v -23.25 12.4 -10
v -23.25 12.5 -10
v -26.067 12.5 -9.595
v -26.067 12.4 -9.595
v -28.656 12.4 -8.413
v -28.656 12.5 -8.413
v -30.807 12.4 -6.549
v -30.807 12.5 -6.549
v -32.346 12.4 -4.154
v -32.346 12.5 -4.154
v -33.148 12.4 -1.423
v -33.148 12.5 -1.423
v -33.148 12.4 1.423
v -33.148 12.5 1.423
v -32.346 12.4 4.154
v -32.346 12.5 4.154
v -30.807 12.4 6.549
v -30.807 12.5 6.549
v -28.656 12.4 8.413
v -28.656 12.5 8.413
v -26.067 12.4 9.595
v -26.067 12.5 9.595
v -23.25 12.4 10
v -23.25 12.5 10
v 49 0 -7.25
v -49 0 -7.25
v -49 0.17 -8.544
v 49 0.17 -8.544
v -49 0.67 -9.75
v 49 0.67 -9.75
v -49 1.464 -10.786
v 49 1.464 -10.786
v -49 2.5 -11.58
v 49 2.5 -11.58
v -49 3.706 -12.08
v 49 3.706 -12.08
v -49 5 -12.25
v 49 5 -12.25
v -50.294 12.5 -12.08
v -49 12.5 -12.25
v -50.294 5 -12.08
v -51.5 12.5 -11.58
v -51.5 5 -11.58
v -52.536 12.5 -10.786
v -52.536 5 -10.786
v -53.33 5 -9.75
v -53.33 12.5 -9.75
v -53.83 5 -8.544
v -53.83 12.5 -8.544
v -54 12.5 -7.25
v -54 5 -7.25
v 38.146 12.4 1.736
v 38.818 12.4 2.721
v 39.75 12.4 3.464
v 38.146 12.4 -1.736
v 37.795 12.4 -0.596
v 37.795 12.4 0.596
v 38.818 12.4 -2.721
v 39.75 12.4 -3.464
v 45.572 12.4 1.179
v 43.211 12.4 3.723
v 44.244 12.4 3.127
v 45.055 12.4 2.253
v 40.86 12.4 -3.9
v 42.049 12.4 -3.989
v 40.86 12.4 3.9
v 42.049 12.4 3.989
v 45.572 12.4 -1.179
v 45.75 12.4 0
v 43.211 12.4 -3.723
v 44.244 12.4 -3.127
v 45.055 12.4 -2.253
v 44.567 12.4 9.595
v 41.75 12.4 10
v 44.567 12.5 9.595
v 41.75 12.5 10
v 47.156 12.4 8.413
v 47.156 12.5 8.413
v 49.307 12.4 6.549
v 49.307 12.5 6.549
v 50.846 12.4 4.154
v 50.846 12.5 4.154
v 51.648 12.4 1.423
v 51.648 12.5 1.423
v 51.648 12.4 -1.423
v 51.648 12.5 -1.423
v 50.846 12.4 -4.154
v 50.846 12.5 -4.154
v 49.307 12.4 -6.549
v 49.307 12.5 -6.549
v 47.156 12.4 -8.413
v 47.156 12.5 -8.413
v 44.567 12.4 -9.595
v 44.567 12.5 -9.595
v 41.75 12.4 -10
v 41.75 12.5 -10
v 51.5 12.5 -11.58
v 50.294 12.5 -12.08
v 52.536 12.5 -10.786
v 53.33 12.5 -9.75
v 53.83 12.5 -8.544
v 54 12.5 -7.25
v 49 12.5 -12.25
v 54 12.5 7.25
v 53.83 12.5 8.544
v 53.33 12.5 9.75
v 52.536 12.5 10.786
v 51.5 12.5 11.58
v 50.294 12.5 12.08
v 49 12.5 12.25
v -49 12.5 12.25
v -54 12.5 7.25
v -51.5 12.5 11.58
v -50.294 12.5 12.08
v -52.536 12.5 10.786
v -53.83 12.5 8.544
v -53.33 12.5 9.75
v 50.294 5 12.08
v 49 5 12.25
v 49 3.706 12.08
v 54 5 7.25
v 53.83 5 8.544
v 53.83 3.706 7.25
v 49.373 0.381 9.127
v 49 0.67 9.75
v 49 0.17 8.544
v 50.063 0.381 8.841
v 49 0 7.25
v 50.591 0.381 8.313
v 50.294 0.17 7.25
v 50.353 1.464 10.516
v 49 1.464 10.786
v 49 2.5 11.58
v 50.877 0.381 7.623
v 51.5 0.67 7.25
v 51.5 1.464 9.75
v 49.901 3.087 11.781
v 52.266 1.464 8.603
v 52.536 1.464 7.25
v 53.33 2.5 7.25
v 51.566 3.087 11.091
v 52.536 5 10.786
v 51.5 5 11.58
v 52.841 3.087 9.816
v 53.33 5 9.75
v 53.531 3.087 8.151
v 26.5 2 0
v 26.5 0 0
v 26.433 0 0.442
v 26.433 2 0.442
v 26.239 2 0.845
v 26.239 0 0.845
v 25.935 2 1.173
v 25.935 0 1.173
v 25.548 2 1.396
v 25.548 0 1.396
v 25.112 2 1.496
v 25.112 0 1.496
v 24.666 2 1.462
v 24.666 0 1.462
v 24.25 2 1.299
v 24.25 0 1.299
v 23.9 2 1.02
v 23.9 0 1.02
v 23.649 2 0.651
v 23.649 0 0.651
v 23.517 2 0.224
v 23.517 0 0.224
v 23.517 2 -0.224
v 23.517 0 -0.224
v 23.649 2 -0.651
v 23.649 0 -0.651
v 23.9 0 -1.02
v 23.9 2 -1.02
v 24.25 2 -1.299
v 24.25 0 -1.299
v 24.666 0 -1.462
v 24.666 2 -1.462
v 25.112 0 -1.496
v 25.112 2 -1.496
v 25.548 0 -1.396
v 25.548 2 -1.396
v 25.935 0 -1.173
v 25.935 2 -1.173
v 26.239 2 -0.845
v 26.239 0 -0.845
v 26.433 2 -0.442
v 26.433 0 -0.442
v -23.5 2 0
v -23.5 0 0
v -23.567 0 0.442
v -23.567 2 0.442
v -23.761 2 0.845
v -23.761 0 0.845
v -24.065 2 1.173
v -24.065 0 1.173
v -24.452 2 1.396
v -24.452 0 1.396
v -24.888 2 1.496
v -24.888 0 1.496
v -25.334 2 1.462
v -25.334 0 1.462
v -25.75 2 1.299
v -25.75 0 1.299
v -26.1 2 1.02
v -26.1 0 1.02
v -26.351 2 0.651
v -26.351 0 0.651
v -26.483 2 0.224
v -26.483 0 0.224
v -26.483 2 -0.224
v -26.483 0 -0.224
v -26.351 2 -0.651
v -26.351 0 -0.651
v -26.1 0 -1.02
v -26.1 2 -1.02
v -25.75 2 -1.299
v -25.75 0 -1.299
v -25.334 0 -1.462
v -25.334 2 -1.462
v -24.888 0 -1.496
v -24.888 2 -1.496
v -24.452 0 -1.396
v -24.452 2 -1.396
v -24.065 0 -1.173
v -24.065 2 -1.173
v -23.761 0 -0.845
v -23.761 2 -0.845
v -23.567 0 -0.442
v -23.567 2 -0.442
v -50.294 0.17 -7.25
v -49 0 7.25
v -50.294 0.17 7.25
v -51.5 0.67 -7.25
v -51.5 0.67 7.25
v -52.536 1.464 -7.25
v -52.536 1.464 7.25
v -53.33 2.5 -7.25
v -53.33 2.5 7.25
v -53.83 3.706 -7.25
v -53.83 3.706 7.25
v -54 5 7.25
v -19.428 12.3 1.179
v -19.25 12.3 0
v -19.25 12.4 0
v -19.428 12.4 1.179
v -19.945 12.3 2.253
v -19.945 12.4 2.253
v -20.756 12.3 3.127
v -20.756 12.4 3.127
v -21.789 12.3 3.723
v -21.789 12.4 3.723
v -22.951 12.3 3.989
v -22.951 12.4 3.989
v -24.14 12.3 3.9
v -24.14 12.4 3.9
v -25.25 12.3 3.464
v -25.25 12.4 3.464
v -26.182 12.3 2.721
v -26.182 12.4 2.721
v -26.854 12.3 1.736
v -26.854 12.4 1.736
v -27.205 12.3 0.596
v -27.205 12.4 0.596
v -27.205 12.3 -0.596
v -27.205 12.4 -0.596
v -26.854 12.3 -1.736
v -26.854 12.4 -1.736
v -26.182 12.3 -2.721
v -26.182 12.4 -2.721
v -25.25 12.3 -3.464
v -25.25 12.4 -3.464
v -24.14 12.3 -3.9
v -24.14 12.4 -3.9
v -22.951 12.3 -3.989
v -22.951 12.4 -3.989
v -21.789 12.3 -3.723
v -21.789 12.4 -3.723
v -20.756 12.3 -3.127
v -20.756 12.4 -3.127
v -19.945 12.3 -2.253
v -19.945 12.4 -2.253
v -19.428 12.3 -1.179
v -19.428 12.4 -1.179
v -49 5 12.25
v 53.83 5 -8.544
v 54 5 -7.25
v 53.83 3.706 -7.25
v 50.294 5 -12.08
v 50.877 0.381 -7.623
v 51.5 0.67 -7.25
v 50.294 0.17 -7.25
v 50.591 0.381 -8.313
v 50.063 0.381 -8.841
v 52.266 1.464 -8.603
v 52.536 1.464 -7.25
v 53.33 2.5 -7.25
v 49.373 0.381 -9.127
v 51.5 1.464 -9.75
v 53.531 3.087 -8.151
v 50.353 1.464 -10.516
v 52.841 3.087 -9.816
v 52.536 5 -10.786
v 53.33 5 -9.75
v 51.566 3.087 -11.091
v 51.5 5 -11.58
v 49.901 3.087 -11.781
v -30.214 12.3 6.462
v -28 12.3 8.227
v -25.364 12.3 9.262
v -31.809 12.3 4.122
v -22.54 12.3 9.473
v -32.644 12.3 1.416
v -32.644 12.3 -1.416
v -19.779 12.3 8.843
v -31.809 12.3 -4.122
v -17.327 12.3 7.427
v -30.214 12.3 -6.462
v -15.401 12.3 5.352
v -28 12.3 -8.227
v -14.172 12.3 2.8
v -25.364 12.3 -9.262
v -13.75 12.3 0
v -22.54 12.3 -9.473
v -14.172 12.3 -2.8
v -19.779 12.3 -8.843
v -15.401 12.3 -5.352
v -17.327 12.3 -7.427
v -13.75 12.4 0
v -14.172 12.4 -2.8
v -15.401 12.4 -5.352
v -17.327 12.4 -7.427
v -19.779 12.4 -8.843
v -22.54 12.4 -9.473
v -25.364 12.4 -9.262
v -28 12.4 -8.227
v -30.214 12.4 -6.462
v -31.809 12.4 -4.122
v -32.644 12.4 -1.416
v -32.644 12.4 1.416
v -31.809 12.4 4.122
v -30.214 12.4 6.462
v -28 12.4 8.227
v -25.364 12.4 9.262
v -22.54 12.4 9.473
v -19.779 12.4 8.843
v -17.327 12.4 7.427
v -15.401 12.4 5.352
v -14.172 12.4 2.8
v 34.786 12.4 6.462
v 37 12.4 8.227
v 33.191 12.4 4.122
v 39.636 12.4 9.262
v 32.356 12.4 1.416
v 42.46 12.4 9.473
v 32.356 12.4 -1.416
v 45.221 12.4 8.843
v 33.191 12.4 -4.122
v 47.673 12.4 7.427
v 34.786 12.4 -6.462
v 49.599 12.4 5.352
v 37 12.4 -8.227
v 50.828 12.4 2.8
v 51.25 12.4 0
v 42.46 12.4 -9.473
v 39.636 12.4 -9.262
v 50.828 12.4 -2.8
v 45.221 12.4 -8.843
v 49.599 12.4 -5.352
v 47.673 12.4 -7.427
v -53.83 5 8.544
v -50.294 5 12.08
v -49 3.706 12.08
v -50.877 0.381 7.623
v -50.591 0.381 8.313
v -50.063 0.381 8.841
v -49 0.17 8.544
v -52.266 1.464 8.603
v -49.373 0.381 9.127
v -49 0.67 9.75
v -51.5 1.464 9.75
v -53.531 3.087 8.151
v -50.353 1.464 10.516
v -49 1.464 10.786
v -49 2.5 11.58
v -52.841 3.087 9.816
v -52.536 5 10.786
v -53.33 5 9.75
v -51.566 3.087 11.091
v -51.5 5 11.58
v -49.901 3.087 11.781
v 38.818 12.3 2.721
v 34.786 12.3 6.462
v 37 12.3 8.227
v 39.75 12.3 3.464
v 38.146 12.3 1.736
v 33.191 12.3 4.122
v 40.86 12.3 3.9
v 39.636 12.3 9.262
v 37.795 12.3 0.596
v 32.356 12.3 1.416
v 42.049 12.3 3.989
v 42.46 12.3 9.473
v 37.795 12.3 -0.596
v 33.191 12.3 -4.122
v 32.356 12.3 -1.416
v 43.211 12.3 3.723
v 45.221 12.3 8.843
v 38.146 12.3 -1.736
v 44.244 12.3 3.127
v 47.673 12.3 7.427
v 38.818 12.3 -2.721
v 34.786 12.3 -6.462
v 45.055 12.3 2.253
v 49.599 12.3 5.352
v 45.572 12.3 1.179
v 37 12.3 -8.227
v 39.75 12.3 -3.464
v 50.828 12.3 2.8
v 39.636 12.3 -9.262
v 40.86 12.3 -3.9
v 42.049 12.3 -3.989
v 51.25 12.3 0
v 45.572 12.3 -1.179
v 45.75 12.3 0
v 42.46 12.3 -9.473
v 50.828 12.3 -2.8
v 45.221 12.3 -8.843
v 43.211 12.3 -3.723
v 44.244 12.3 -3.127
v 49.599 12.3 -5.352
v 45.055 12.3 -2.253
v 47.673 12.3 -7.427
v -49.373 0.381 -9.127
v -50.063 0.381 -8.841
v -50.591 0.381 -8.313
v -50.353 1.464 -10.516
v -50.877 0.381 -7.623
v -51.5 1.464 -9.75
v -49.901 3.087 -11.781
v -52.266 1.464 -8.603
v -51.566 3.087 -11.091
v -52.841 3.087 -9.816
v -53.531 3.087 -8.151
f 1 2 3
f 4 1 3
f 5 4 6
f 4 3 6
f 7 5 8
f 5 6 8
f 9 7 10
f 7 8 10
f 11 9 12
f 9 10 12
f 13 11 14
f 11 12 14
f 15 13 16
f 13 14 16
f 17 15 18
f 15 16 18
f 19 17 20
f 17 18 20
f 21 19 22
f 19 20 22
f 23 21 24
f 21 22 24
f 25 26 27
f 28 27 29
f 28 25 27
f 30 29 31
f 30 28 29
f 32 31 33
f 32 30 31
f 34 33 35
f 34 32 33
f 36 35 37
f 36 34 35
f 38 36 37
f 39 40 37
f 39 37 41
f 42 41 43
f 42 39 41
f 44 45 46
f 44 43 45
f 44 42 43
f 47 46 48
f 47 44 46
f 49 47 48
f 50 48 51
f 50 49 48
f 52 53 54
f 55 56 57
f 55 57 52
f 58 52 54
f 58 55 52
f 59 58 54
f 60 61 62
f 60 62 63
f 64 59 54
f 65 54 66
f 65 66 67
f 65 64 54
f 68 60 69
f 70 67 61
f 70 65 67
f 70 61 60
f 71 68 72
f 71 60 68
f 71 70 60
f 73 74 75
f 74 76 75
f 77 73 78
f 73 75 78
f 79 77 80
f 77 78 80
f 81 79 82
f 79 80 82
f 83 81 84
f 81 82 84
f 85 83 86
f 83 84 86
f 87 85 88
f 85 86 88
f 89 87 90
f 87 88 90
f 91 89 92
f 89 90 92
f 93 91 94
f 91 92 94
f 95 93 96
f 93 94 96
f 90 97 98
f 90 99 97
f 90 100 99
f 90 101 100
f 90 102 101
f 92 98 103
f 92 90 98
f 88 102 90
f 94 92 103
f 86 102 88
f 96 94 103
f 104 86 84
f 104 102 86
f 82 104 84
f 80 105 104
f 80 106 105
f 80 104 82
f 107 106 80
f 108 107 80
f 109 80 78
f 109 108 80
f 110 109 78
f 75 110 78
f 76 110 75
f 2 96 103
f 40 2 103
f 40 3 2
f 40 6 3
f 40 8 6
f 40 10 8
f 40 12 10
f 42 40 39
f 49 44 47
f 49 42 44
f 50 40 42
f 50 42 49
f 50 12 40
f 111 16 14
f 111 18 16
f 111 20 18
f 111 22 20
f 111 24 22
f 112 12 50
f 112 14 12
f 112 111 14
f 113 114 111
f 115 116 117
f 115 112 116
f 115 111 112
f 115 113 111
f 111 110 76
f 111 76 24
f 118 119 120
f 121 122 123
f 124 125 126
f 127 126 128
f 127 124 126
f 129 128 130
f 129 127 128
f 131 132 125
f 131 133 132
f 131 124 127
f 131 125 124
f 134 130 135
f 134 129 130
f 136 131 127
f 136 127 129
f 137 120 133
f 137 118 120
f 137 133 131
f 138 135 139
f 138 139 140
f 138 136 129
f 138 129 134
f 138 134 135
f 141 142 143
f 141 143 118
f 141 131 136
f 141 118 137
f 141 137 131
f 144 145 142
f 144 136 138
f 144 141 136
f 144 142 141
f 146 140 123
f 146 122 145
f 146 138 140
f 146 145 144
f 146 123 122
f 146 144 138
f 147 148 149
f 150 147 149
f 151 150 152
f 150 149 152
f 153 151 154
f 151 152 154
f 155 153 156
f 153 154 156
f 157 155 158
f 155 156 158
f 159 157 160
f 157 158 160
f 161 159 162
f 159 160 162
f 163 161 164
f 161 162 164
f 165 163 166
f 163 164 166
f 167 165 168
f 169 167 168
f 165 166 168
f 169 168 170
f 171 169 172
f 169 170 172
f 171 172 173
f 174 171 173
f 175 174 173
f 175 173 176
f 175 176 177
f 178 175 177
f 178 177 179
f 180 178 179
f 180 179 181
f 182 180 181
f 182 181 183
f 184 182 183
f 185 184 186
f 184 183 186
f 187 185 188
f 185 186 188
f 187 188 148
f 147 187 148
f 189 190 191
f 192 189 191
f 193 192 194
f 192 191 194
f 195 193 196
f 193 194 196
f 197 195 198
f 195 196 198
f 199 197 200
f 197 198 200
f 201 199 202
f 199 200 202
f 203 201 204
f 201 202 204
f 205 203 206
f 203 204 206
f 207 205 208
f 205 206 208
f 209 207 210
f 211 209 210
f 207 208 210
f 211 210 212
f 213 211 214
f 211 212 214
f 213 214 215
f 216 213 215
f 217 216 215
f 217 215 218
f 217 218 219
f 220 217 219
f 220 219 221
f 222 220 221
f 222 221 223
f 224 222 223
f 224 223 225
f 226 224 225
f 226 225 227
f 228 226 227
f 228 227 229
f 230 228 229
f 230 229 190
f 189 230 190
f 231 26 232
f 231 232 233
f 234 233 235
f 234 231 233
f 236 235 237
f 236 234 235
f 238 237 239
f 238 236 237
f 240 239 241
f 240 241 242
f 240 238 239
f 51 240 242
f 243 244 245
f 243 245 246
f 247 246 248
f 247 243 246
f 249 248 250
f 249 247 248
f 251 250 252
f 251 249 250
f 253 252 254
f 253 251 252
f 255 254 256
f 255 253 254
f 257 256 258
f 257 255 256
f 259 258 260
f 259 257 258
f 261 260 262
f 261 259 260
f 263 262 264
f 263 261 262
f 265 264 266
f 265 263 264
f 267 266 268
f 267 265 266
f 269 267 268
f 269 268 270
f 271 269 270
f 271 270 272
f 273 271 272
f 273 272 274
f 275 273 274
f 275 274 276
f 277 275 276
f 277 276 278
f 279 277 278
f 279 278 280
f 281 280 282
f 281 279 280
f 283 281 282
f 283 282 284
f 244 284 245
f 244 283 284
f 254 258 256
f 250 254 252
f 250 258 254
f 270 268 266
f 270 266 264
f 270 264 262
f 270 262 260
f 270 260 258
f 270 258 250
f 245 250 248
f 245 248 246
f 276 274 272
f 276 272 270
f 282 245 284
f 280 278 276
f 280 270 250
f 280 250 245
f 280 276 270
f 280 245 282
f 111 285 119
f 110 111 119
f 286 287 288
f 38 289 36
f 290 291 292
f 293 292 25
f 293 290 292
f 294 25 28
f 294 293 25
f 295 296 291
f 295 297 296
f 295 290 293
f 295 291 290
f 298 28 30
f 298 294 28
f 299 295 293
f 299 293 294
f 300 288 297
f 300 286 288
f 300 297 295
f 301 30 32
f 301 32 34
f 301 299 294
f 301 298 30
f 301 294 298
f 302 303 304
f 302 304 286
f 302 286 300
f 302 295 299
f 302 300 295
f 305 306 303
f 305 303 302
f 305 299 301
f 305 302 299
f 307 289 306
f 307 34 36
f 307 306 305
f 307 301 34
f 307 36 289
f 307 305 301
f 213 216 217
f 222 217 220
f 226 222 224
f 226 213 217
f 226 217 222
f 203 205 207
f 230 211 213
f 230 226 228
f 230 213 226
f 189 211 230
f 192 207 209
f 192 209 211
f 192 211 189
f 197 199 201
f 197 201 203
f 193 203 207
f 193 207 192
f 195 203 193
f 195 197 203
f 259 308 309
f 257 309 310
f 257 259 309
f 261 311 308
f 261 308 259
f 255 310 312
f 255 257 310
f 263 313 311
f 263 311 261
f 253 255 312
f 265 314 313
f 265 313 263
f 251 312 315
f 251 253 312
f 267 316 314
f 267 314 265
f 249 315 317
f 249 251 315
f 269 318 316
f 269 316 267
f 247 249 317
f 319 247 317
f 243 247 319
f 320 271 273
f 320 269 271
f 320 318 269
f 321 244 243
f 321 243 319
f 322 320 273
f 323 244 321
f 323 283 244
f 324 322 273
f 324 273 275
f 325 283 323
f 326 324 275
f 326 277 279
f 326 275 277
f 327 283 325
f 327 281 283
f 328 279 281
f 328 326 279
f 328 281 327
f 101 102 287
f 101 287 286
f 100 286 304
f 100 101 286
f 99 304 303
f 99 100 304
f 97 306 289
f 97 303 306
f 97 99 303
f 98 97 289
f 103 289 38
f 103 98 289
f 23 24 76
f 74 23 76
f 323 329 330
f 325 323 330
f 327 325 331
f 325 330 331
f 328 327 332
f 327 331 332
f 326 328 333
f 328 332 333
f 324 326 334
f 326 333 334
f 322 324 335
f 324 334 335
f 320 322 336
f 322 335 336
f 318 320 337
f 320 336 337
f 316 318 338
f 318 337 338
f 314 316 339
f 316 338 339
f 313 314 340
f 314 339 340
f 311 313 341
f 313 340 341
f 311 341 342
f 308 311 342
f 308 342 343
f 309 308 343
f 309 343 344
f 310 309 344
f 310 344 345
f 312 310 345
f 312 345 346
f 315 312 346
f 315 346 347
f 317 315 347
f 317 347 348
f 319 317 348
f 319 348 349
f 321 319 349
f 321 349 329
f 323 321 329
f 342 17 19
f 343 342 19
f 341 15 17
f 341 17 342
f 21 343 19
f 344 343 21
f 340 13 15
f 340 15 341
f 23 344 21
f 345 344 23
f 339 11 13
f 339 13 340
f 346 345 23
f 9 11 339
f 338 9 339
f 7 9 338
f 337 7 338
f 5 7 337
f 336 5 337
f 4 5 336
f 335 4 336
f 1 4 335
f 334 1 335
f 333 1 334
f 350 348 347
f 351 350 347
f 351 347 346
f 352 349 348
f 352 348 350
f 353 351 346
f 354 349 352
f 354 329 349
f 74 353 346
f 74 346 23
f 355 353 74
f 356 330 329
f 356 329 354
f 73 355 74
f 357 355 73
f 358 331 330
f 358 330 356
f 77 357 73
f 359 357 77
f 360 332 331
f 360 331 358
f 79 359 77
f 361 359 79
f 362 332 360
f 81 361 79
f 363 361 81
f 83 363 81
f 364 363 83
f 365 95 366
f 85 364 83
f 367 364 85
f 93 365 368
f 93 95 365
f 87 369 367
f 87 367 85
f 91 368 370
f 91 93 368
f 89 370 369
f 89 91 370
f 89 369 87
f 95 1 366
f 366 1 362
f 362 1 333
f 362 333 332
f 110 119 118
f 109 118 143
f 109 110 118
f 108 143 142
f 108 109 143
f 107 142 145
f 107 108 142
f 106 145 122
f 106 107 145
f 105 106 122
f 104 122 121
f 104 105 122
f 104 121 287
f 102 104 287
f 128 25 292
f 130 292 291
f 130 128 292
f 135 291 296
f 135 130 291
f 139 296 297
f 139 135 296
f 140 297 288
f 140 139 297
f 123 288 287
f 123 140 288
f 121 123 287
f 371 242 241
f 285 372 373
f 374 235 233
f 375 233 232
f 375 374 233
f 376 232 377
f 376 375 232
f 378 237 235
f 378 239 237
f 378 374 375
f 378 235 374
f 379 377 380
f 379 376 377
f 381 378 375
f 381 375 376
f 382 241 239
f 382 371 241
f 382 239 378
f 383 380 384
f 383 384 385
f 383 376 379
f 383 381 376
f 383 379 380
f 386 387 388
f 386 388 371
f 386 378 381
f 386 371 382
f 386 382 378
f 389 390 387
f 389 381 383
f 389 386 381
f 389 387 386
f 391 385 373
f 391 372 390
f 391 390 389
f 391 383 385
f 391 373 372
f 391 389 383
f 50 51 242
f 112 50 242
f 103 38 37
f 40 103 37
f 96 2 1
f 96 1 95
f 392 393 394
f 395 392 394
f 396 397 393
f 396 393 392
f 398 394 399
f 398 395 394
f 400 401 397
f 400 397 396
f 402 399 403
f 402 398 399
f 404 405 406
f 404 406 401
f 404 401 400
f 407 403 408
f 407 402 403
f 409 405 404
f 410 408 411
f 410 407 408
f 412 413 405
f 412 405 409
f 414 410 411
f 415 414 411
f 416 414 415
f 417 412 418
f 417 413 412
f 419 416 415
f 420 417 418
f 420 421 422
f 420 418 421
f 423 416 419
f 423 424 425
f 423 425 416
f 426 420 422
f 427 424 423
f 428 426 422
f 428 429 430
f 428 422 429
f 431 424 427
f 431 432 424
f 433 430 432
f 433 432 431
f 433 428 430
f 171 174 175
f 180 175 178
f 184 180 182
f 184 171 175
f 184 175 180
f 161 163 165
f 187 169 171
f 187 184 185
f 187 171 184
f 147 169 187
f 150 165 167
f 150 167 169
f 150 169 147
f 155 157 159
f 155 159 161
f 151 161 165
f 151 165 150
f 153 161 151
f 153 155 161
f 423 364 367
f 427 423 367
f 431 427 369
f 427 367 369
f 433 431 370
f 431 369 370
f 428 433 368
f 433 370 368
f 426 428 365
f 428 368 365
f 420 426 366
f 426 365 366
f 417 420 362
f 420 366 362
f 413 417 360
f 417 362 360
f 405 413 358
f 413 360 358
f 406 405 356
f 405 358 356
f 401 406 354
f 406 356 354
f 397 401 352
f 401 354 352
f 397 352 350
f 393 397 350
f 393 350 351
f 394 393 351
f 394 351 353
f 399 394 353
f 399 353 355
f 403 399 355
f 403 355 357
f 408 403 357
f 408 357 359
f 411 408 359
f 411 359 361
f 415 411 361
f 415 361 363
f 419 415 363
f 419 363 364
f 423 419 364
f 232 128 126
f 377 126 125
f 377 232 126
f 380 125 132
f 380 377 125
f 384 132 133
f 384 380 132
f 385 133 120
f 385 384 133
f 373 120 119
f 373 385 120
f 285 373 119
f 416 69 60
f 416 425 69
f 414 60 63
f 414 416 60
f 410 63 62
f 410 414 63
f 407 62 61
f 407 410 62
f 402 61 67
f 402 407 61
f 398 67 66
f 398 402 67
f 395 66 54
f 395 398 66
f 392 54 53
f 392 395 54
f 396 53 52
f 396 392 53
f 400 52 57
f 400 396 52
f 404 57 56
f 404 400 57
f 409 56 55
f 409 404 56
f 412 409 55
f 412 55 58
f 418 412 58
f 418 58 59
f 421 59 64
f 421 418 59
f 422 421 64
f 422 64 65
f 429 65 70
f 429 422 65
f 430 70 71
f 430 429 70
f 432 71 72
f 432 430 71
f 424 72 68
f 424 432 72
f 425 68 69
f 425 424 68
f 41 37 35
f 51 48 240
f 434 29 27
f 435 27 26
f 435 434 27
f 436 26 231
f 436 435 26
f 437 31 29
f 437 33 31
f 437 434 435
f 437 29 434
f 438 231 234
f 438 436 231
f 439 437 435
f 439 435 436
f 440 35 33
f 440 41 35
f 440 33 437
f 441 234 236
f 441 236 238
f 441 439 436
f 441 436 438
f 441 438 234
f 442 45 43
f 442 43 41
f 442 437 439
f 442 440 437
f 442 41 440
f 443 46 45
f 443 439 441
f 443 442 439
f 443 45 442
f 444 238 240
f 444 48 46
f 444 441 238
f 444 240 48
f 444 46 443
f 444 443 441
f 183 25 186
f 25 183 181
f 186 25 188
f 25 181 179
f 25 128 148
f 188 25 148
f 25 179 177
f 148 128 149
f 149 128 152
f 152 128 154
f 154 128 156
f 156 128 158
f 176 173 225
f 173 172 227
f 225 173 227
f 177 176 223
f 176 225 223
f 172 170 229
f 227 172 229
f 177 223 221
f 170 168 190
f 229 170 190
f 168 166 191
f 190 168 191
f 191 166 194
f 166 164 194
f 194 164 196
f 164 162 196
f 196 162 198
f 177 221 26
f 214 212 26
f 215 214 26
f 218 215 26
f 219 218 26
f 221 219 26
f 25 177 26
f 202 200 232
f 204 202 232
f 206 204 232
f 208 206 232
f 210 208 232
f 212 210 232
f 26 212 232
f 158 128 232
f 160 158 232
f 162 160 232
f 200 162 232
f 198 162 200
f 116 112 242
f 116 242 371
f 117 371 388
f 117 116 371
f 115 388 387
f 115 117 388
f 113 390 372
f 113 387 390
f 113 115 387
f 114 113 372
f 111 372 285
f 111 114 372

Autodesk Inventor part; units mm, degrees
ref_plane "YZ Plane" through (0, 0, 0) normal (1, 0, 0) x (0, 1, 0)
ref_plane "XZ Plane" through (0, 0, 0) normal (0, 1, 0) x (-1, 0, 0)
ref_plane "XY Plane" through (0, 0, 0) normal (0, 0, 1) x (1, 0, 0)
sketch "Sketch1" plane through (0, 0, 0) normal (0, 1, 0) x (-1, 0, 0)
  line L0 (0, 0) -> (0, -12.25)
  line L1 (0, -12.25) -> (54, -12.25)
  line L2 (54, -12.25) -> (54, 12.25)
  line L3 (54, 12.25) -> (-54, 12.25)
  line L4 (-54, 12.25) -> (-54, -12.25)
  line L5 (-54, -12.25) -> (0, -12.25)
  dimension "d0" = 12.25
  dimension "d1" = 54
  dimension "d2" = 24.5
  dimension "d3" = 108
  dimension "d4" = 24.5
extrude "Extrusion1" add sketch "Sketch1" along normal blind 12.5
fillet "Fillet1" radius 5 4 edges at (-54, 6.25, 12.25) (-54, 6.25, -12.25) (54, 6.25, 12.25) (54, 6.25, -12.25)
sketch "Sketch2" plane through (0, 12.5, 0) normal (0, 1, 0) x (1, 0, 0)
  line L0 (54, -7.25) -> (54, 7.25) projected
  line L1 (54, 0) -> (41.75, 0)
  circle A0 centre (41.75, 0) radius 10
  line L2 (41.75, 0) -> (-23.25, 0)
  circle A1 centre (-23.25, 0) radius 10
  line L3 (-23.25, 10) -> (41.75, 10)
  line L4 (-23.25, -10) -> (41.75, -10)
  point P0 (0, 0)
  dimension "d8" = 12.25
  dimension "d9" = 20
  dimension "d10" = 65
  dimension "d11" = 20
extrude "Extrusion2" cut sketch "Sketch2" against normal blind 0.1
sketch "Sketch3" plane through (0, 12.4, 0) normal (0, 1, 0) x (1, 0, 0)
  line L0 (-23.25, 10) -> (41.75, 10) projected
  arc A0 (-23.25, 10) -> (-23.25, -10) centre (-23.25, 0) ccw projected
  line L1 (41.75, -10) -> (-23.25, -10) projected
  arc A1 (41.75, -10) -> (41.75, 10) centre (41.75, 0) ccw projected
  circle A2 centre (-23.25, 0) radius 9.5
  circle A3 centre (41.75, 0) radius 9.5
  point P0 (0, 0)
  dimension "d14" = 19
  dimension "d15" = 19
extrude "Extrusion3" cut sketch "Sketch3" against normal blind 0.1 contours A2 | A3
sketch "Sketch4" plane through (-23.25, 12.3, 0) normal (0, 1, 0) x (1, 0, 0)
  circle A0 centre (0, 0) radius 9.5 projected
  circle A1 centre (65, 0) radius 9.5 projected
  circle A2 centre (0, 0) radius 4
  circle A3 centre (65, 0) radius 4
  point P0 (23.25, 0)
  dimension "d18" = 8
  dimension "d19" = 8
extrude "Extrusion4" add sketch "Sketch4" along normal blind 0.1 contours A2 | A3
fillet "Fillet2" radius 5 8 edges at (-52.5355, 0, -10.7855) (-54, 0, 0) (-52.5355, 0, 10.7855) (0, 0, 12.25) (52.5355, 0, 10.7855) (54, 0, 0) (52.5355, 0, -10.7855) (0, 0, -12.25)
sketch "Sketch5" plane through (0, 0, 0) normal (0, -1, 0) x (1, 0, 0)
  line L0 (0, 0) -> (-25, 0)
  line L1 (0, 0) -> (25, 0)
  circle A0 centre (25, 0) radius 1.5
  circle A1 centre (-25, 0) radius 1.5
  dimension "d23" = 25
  dimension "d24" = 25
  dimension "d25" = 3
  dimension "d26" = 3
extrude "Extrusion5" cut sketch "Sketch5" against normal blind 2
properties part number "IntelRealSenseT265"
